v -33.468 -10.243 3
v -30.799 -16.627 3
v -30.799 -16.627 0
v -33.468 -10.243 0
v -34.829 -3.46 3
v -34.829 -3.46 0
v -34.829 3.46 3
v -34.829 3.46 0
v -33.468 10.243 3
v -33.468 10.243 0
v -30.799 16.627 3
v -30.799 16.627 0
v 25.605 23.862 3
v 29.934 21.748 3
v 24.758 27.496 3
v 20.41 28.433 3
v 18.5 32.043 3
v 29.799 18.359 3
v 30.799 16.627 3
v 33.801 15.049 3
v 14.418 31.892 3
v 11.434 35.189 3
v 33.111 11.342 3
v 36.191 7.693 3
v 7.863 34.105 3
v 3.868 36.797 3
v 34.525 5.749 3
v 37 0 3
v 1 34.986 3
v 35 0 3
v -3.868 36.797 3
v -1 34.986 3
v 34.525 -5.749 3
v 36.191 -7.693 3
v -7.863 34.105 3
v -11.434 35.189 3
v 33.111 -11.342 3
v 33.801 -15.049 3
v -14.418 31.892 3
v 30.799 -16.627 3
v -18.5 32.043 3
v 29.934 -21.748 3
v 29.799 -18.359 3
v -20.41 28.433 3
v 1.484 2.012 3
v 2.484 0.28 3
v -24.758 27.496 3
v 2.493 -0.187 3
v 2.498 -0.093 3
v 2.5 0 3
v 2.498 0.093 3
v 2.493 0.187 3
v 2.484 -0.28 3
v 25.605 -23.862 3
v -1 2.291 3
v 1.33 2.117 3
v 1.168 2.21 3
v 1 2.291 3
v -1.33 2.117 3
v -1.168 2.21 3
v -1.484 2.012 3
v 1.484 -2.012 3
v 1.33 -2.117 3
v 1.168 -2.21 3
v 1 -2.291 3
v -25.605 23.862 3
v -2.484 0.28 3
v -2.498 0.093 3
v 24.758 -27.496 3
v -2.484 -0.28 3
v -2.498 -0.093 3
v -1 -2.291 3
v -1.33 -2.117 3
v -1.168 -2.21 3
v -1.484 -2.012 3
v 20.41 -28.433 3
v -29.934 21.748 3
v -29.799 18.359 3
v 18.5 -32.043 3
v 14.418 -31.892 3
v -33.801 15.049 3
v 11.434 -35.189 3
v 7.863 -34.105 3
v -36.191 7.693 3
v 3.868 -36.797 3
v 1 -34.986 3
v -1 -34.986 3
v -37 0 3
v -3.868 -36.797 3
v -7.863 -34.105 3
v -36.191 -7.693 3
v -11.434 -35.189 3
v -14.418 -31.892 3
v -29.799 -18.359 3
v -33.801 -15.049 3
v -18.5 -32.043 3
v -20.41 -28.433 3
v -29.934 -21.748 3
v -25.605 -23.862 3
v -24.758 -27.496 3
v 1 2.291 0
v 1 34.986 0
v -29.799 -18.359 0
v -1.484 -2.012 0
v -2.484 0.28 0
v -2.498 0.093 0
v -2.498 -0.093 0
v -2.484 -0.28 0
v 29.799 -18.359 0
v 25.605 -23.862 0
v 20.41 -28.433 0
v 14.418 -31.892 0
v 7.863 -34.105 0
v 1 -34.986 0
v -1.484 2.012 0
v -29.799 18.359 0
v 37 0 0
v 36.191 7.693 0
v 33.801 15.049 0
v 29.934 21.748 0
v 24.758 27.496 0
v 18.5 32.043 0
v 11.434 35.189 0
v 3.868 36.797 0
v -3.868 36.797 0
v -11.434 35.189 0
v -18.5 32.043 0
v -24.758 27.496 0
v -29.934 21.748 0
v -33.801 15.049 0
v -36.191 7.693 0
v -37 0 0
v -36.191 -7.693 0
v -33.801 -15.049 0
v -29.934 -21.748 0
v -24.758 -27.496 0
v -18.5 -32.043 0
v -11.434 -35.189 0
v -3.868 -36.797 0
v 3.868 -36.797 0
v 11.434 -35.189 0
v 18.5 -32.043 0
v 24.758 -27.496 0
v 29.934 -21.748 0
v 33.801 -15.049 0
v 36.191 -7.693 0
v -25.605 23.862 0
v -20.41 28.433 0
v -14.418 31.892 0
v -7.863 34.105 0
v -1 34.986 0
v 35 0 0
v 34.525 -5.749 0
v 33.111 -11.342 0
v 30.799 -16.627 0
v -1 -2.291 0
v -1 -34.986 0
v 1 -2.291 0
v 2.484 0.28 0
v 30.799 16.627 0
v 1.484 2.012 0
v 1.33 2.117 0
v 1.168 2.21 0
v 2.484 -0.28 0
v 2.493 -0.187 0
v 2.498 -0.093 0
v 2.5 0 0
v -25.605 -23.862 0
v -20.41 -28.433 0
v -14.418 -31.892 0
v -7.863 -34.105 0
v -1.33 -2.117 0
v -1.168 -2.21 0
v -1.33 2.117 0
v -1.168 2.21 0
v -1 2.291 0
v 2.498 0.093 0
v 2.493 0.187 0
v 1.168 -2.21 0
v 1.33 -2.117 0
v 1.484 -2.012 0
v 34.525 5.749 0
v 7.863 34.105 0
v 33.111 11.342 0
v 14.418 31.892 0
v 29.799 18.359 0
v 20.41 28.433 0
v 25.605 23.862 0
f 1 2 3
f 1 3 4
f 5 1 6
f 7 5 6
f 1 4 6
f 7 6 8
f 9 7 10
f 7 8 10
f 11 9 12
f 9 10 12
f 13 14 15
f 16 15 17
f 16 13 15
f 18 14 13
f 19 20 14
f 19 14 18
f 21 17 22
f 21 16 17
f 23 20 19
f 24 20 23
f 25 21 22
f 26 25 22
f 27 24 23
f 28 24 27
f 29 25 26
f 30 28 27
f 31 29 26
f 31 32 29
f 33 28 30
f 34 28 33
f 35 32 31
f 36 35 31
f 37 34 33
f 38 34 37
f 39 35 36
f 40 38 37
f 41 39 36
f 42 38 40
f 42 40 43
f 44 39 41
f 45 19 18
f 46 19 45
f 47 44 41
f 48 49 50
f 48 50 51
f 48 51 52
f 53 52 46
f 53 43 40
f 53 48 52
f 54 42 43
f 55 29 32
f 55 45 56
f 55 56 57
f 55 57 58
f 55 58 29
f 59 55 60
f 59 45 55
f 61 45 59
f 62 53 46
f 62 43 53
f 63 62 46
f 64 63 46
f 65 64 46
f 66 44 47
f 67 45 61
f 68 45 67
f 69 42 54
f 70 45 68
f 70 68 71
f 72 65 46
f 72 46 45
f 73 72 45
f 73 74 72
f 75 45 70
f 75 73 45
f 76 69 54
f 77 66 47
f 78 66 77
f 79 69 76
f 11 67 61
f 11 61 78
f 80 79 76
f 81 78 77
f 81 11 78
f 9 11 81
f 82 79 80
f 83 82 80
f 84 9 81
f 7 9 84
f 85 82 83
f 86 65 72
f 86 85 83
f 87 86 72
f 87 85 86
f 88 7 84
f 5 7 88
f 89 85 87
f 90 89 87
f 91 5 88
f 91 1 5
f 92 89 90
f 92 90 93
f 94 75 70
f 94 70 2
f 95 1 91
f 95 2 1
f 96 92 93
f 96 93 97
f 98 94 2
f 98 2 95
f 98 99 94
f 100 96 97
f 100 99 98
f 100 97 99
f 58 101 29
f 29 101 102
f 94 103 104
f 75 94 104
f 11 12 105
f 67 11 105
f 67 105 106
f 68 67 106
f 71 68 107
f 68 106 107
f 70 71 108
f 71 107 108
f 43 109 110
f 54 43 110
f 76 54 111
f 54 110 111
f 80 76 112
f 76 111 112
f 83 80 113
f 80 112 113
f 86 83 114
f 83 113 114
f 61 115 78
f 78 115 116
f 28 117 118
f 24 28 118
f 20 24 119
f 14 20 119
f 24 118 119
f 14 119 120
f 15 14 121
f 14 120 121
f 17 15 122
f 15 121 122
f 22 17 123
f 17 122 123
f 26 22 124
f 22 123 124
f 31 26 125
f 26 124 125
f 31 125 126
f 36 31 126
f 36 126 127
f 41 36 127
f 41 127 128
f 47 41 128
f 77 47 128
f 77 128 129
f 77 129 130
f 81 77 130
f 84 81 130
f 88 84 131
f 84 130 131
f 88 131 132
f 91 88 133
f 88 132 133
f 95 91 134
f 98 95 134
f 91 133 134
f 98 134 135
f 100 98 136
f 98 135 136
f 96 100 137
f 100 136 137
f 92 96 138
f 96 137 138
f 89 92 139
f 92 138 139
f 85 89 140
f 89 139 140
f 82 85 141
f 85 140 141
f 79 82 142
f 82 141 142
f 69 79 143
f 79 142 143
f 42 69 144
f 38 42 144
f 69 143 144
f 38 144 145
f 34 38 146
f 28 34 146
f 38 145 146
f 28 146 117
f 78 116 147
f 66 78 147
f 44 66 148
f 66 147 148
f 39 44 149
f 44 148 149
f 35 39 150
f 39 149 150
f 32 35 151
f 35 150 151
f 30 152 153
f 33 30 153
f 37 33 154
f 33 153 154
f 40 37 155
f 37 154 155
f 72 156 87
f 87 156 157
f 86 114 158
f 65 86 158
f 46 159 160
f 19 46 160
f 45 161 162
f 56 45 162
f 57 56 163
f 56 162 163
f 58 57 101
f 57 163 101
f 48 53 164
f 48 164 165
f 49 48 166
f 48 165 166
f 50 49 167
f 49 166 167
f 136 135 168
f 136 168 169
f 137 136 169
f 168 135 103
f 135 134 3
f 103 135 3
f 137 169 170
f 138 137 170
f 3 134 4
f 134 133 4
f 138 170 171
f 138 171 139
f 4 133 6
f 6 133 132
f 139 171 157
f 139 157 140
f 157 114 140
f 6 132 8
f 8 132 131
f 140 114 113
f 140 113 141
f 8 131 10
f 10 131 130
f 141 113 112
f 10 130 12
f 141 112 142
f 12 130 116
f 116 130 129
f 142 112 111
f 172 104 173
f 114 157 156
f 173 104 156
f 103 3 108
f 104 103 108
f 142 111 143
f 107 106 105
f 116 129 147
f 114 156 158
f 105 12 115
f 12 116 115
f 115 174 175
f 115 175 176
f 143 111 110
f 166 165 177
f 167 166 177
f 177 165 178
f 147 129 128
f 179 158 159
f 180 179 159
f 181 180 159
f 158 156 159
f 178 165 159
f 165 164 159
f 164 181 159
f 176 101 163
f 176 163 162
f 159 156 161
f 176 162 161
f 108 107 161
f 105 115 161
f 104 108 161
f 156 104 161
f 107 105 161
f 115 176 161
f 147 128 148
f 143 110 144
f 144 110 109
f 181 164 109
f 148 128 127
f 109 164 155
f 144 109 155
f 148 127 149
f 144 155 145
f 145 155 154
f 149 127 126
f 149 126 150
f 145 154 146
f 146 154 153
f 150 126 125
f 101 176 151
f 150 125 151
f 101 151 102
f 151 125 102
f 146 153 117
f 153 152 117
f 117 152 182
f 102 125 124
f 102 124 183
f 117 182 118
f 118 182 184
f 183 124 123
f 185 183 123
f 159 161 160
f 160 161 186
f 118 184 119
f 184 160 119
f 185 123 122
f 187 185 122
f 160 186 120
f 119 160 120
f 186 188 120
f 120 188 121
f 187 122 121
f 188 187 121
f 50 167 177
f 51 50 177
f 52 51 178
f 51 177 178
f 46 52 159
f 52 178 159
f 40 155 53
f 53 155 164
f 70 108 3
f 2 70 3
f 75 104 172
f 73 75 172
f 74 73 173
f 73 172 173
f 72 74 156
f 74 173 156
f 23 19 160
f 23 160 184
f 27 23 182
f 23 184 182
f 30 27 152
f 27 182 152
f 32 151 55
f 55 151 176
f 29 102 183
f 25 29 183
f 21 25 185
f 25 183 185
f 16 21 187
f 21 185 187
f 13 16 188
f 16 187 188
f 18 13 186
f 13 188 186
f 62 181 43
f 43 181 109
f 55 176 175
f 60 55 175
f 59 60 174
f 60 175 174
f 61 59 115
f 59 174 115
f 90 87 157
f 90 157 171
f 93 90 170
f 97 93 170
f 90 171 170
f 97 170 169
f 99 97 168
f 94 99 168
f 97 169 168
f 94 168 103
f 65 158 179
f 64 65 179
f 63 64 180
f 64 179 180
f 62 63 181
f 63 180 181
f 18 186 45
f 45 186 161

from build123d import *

# Parameters (mm, degrees)
F0_R            = 37
F1_DEPTH        = 3
F2_DEPTH        = 3
F2_COPIES_COUNT = 6


# Not quite as in the source:
# - a pattern or mirror of a feature is missing from the dataset's text; its kind, count and spacing are read off the source's solid


with BuildPart() as f1:
    # F0 (on Top) → F1 (new body)
    with BuildSketch(Plane.XY):
        Circle(F0_R)
        with BuildLine():
            Line((1, 35.6262177595), (1, 34.9857113691))
            ThreePointArc((1, 34.9857113691), (25.099800796, 24.3926218353), (35, 0))
            ThreePointArc((35, 0), (-24.3926218353, -25.099800796), (-1, 34.9857113691))
            Line((-1, 34.9857113691), (-1, 35.6262177595))
            Line((-1, 35.6262177595), (1, 35.6262177595))
        make_face(mode=Mode.SUBTRACT)
        with BuildLine():
            ThreePointArc((-1, 34.9857113691), (0, 35), (1, 34.9857113691))
            Line((1, 34.9857113691), (1, 35.6262177595))
            Line((1, 35.6262177595), (-1, 35.6262177595))
            Line((-1, 35.6262177595), (-1, 34.9857113691))
        make_face()
    extrude(amount=F1_DEPTH)



with BuildPart() as f1b:
    # F0 (on Top) → F1, piece 2 (new body)
    with BuildSketch(Plane.XY):
        with BuildLine():
            ThreePointArc((-1, 2.2912878475), (-1.3693063938, -2.0916500663), (2.5, 0))
            ThreePointArc((2.5, 0), (2.0916500663, 1.3693063938), (1, 2.2912878475))
            Line((1, 2.2912878475), (1, 0.5877822405))
            Line((1, 0.5877822405), (-1, 0.5877822405))
            Line((-1, 0.5877822405), (-1, 2.2912878475))
        make_face()
        with BuildLine():
            Line((1, 0.5877822405), (1, 2.2912878475))
            ThreePointArc((1, 2.2912878475), (0, 2.5), (-1, 2.2912878475))
            Line((-1, 2.2912878475), (-1, 0.5877822405))
            Line((-1, 0.5877822405), (1, 0.5877822405))
        make_face()
    extrude(amount=F1_DEPTH)


with BuildPart() as f1_1:
    add(f1.part)

    add(f1b.part)  # F2 merges F1b
    # F0 (on Top) → F2 (join)
    with BuildSketch(Plane.XY):
        with BuildLine():
            Line((1, 0.5877822405), (1, 2.2912878475))
            ThreePointArc((1, 2.2912878475), (0, 2.5), (-1, 2.2912878475))
            Line((-1, 2.2912878475), (-1, 0.5877822405))
            Line((-1, 0.5877822405), (1, 0.5877822405))
        make_face()
        with BuildLine():
            ThreePointArc((-1, 2.2912878475), (0, 2.5), (1, 2.2912878475))
            Line((1, 2.2912878475), (1, 34.9857113691))
            ThreePointArc((1, 34.9857113691), (0, 35), (-1, 34.9857113691))
            Line((-1, 34.9857113691), (-1, 2.2912878475))
        make_face()
        with BuildLine():
            ThreePointArc((-1, 34.9857113691), (0, 35), (1, 34.9857113691))
            Line((1, 34.9857113691), (1, 35.6262177595))
            Line((1, 35.6262177595), (-1, 35.6262177595))
            Line((-1, 35.6262177595), (-1, 34.9857113691))
        make_face()
    f2 = extrude(amount=F2_DEPTH)

    # F2_copies: F2 ×6 about axis
    f2_copies_axis = Axis((0, 0, 0), (0, 0, 1))
    for i in range(1, F2_COPIES_COUNT):
        add(f2.rotate(f2_copies_axis, i * 360 / F2_COPIES_COUNT))


solid = f1_1.part
